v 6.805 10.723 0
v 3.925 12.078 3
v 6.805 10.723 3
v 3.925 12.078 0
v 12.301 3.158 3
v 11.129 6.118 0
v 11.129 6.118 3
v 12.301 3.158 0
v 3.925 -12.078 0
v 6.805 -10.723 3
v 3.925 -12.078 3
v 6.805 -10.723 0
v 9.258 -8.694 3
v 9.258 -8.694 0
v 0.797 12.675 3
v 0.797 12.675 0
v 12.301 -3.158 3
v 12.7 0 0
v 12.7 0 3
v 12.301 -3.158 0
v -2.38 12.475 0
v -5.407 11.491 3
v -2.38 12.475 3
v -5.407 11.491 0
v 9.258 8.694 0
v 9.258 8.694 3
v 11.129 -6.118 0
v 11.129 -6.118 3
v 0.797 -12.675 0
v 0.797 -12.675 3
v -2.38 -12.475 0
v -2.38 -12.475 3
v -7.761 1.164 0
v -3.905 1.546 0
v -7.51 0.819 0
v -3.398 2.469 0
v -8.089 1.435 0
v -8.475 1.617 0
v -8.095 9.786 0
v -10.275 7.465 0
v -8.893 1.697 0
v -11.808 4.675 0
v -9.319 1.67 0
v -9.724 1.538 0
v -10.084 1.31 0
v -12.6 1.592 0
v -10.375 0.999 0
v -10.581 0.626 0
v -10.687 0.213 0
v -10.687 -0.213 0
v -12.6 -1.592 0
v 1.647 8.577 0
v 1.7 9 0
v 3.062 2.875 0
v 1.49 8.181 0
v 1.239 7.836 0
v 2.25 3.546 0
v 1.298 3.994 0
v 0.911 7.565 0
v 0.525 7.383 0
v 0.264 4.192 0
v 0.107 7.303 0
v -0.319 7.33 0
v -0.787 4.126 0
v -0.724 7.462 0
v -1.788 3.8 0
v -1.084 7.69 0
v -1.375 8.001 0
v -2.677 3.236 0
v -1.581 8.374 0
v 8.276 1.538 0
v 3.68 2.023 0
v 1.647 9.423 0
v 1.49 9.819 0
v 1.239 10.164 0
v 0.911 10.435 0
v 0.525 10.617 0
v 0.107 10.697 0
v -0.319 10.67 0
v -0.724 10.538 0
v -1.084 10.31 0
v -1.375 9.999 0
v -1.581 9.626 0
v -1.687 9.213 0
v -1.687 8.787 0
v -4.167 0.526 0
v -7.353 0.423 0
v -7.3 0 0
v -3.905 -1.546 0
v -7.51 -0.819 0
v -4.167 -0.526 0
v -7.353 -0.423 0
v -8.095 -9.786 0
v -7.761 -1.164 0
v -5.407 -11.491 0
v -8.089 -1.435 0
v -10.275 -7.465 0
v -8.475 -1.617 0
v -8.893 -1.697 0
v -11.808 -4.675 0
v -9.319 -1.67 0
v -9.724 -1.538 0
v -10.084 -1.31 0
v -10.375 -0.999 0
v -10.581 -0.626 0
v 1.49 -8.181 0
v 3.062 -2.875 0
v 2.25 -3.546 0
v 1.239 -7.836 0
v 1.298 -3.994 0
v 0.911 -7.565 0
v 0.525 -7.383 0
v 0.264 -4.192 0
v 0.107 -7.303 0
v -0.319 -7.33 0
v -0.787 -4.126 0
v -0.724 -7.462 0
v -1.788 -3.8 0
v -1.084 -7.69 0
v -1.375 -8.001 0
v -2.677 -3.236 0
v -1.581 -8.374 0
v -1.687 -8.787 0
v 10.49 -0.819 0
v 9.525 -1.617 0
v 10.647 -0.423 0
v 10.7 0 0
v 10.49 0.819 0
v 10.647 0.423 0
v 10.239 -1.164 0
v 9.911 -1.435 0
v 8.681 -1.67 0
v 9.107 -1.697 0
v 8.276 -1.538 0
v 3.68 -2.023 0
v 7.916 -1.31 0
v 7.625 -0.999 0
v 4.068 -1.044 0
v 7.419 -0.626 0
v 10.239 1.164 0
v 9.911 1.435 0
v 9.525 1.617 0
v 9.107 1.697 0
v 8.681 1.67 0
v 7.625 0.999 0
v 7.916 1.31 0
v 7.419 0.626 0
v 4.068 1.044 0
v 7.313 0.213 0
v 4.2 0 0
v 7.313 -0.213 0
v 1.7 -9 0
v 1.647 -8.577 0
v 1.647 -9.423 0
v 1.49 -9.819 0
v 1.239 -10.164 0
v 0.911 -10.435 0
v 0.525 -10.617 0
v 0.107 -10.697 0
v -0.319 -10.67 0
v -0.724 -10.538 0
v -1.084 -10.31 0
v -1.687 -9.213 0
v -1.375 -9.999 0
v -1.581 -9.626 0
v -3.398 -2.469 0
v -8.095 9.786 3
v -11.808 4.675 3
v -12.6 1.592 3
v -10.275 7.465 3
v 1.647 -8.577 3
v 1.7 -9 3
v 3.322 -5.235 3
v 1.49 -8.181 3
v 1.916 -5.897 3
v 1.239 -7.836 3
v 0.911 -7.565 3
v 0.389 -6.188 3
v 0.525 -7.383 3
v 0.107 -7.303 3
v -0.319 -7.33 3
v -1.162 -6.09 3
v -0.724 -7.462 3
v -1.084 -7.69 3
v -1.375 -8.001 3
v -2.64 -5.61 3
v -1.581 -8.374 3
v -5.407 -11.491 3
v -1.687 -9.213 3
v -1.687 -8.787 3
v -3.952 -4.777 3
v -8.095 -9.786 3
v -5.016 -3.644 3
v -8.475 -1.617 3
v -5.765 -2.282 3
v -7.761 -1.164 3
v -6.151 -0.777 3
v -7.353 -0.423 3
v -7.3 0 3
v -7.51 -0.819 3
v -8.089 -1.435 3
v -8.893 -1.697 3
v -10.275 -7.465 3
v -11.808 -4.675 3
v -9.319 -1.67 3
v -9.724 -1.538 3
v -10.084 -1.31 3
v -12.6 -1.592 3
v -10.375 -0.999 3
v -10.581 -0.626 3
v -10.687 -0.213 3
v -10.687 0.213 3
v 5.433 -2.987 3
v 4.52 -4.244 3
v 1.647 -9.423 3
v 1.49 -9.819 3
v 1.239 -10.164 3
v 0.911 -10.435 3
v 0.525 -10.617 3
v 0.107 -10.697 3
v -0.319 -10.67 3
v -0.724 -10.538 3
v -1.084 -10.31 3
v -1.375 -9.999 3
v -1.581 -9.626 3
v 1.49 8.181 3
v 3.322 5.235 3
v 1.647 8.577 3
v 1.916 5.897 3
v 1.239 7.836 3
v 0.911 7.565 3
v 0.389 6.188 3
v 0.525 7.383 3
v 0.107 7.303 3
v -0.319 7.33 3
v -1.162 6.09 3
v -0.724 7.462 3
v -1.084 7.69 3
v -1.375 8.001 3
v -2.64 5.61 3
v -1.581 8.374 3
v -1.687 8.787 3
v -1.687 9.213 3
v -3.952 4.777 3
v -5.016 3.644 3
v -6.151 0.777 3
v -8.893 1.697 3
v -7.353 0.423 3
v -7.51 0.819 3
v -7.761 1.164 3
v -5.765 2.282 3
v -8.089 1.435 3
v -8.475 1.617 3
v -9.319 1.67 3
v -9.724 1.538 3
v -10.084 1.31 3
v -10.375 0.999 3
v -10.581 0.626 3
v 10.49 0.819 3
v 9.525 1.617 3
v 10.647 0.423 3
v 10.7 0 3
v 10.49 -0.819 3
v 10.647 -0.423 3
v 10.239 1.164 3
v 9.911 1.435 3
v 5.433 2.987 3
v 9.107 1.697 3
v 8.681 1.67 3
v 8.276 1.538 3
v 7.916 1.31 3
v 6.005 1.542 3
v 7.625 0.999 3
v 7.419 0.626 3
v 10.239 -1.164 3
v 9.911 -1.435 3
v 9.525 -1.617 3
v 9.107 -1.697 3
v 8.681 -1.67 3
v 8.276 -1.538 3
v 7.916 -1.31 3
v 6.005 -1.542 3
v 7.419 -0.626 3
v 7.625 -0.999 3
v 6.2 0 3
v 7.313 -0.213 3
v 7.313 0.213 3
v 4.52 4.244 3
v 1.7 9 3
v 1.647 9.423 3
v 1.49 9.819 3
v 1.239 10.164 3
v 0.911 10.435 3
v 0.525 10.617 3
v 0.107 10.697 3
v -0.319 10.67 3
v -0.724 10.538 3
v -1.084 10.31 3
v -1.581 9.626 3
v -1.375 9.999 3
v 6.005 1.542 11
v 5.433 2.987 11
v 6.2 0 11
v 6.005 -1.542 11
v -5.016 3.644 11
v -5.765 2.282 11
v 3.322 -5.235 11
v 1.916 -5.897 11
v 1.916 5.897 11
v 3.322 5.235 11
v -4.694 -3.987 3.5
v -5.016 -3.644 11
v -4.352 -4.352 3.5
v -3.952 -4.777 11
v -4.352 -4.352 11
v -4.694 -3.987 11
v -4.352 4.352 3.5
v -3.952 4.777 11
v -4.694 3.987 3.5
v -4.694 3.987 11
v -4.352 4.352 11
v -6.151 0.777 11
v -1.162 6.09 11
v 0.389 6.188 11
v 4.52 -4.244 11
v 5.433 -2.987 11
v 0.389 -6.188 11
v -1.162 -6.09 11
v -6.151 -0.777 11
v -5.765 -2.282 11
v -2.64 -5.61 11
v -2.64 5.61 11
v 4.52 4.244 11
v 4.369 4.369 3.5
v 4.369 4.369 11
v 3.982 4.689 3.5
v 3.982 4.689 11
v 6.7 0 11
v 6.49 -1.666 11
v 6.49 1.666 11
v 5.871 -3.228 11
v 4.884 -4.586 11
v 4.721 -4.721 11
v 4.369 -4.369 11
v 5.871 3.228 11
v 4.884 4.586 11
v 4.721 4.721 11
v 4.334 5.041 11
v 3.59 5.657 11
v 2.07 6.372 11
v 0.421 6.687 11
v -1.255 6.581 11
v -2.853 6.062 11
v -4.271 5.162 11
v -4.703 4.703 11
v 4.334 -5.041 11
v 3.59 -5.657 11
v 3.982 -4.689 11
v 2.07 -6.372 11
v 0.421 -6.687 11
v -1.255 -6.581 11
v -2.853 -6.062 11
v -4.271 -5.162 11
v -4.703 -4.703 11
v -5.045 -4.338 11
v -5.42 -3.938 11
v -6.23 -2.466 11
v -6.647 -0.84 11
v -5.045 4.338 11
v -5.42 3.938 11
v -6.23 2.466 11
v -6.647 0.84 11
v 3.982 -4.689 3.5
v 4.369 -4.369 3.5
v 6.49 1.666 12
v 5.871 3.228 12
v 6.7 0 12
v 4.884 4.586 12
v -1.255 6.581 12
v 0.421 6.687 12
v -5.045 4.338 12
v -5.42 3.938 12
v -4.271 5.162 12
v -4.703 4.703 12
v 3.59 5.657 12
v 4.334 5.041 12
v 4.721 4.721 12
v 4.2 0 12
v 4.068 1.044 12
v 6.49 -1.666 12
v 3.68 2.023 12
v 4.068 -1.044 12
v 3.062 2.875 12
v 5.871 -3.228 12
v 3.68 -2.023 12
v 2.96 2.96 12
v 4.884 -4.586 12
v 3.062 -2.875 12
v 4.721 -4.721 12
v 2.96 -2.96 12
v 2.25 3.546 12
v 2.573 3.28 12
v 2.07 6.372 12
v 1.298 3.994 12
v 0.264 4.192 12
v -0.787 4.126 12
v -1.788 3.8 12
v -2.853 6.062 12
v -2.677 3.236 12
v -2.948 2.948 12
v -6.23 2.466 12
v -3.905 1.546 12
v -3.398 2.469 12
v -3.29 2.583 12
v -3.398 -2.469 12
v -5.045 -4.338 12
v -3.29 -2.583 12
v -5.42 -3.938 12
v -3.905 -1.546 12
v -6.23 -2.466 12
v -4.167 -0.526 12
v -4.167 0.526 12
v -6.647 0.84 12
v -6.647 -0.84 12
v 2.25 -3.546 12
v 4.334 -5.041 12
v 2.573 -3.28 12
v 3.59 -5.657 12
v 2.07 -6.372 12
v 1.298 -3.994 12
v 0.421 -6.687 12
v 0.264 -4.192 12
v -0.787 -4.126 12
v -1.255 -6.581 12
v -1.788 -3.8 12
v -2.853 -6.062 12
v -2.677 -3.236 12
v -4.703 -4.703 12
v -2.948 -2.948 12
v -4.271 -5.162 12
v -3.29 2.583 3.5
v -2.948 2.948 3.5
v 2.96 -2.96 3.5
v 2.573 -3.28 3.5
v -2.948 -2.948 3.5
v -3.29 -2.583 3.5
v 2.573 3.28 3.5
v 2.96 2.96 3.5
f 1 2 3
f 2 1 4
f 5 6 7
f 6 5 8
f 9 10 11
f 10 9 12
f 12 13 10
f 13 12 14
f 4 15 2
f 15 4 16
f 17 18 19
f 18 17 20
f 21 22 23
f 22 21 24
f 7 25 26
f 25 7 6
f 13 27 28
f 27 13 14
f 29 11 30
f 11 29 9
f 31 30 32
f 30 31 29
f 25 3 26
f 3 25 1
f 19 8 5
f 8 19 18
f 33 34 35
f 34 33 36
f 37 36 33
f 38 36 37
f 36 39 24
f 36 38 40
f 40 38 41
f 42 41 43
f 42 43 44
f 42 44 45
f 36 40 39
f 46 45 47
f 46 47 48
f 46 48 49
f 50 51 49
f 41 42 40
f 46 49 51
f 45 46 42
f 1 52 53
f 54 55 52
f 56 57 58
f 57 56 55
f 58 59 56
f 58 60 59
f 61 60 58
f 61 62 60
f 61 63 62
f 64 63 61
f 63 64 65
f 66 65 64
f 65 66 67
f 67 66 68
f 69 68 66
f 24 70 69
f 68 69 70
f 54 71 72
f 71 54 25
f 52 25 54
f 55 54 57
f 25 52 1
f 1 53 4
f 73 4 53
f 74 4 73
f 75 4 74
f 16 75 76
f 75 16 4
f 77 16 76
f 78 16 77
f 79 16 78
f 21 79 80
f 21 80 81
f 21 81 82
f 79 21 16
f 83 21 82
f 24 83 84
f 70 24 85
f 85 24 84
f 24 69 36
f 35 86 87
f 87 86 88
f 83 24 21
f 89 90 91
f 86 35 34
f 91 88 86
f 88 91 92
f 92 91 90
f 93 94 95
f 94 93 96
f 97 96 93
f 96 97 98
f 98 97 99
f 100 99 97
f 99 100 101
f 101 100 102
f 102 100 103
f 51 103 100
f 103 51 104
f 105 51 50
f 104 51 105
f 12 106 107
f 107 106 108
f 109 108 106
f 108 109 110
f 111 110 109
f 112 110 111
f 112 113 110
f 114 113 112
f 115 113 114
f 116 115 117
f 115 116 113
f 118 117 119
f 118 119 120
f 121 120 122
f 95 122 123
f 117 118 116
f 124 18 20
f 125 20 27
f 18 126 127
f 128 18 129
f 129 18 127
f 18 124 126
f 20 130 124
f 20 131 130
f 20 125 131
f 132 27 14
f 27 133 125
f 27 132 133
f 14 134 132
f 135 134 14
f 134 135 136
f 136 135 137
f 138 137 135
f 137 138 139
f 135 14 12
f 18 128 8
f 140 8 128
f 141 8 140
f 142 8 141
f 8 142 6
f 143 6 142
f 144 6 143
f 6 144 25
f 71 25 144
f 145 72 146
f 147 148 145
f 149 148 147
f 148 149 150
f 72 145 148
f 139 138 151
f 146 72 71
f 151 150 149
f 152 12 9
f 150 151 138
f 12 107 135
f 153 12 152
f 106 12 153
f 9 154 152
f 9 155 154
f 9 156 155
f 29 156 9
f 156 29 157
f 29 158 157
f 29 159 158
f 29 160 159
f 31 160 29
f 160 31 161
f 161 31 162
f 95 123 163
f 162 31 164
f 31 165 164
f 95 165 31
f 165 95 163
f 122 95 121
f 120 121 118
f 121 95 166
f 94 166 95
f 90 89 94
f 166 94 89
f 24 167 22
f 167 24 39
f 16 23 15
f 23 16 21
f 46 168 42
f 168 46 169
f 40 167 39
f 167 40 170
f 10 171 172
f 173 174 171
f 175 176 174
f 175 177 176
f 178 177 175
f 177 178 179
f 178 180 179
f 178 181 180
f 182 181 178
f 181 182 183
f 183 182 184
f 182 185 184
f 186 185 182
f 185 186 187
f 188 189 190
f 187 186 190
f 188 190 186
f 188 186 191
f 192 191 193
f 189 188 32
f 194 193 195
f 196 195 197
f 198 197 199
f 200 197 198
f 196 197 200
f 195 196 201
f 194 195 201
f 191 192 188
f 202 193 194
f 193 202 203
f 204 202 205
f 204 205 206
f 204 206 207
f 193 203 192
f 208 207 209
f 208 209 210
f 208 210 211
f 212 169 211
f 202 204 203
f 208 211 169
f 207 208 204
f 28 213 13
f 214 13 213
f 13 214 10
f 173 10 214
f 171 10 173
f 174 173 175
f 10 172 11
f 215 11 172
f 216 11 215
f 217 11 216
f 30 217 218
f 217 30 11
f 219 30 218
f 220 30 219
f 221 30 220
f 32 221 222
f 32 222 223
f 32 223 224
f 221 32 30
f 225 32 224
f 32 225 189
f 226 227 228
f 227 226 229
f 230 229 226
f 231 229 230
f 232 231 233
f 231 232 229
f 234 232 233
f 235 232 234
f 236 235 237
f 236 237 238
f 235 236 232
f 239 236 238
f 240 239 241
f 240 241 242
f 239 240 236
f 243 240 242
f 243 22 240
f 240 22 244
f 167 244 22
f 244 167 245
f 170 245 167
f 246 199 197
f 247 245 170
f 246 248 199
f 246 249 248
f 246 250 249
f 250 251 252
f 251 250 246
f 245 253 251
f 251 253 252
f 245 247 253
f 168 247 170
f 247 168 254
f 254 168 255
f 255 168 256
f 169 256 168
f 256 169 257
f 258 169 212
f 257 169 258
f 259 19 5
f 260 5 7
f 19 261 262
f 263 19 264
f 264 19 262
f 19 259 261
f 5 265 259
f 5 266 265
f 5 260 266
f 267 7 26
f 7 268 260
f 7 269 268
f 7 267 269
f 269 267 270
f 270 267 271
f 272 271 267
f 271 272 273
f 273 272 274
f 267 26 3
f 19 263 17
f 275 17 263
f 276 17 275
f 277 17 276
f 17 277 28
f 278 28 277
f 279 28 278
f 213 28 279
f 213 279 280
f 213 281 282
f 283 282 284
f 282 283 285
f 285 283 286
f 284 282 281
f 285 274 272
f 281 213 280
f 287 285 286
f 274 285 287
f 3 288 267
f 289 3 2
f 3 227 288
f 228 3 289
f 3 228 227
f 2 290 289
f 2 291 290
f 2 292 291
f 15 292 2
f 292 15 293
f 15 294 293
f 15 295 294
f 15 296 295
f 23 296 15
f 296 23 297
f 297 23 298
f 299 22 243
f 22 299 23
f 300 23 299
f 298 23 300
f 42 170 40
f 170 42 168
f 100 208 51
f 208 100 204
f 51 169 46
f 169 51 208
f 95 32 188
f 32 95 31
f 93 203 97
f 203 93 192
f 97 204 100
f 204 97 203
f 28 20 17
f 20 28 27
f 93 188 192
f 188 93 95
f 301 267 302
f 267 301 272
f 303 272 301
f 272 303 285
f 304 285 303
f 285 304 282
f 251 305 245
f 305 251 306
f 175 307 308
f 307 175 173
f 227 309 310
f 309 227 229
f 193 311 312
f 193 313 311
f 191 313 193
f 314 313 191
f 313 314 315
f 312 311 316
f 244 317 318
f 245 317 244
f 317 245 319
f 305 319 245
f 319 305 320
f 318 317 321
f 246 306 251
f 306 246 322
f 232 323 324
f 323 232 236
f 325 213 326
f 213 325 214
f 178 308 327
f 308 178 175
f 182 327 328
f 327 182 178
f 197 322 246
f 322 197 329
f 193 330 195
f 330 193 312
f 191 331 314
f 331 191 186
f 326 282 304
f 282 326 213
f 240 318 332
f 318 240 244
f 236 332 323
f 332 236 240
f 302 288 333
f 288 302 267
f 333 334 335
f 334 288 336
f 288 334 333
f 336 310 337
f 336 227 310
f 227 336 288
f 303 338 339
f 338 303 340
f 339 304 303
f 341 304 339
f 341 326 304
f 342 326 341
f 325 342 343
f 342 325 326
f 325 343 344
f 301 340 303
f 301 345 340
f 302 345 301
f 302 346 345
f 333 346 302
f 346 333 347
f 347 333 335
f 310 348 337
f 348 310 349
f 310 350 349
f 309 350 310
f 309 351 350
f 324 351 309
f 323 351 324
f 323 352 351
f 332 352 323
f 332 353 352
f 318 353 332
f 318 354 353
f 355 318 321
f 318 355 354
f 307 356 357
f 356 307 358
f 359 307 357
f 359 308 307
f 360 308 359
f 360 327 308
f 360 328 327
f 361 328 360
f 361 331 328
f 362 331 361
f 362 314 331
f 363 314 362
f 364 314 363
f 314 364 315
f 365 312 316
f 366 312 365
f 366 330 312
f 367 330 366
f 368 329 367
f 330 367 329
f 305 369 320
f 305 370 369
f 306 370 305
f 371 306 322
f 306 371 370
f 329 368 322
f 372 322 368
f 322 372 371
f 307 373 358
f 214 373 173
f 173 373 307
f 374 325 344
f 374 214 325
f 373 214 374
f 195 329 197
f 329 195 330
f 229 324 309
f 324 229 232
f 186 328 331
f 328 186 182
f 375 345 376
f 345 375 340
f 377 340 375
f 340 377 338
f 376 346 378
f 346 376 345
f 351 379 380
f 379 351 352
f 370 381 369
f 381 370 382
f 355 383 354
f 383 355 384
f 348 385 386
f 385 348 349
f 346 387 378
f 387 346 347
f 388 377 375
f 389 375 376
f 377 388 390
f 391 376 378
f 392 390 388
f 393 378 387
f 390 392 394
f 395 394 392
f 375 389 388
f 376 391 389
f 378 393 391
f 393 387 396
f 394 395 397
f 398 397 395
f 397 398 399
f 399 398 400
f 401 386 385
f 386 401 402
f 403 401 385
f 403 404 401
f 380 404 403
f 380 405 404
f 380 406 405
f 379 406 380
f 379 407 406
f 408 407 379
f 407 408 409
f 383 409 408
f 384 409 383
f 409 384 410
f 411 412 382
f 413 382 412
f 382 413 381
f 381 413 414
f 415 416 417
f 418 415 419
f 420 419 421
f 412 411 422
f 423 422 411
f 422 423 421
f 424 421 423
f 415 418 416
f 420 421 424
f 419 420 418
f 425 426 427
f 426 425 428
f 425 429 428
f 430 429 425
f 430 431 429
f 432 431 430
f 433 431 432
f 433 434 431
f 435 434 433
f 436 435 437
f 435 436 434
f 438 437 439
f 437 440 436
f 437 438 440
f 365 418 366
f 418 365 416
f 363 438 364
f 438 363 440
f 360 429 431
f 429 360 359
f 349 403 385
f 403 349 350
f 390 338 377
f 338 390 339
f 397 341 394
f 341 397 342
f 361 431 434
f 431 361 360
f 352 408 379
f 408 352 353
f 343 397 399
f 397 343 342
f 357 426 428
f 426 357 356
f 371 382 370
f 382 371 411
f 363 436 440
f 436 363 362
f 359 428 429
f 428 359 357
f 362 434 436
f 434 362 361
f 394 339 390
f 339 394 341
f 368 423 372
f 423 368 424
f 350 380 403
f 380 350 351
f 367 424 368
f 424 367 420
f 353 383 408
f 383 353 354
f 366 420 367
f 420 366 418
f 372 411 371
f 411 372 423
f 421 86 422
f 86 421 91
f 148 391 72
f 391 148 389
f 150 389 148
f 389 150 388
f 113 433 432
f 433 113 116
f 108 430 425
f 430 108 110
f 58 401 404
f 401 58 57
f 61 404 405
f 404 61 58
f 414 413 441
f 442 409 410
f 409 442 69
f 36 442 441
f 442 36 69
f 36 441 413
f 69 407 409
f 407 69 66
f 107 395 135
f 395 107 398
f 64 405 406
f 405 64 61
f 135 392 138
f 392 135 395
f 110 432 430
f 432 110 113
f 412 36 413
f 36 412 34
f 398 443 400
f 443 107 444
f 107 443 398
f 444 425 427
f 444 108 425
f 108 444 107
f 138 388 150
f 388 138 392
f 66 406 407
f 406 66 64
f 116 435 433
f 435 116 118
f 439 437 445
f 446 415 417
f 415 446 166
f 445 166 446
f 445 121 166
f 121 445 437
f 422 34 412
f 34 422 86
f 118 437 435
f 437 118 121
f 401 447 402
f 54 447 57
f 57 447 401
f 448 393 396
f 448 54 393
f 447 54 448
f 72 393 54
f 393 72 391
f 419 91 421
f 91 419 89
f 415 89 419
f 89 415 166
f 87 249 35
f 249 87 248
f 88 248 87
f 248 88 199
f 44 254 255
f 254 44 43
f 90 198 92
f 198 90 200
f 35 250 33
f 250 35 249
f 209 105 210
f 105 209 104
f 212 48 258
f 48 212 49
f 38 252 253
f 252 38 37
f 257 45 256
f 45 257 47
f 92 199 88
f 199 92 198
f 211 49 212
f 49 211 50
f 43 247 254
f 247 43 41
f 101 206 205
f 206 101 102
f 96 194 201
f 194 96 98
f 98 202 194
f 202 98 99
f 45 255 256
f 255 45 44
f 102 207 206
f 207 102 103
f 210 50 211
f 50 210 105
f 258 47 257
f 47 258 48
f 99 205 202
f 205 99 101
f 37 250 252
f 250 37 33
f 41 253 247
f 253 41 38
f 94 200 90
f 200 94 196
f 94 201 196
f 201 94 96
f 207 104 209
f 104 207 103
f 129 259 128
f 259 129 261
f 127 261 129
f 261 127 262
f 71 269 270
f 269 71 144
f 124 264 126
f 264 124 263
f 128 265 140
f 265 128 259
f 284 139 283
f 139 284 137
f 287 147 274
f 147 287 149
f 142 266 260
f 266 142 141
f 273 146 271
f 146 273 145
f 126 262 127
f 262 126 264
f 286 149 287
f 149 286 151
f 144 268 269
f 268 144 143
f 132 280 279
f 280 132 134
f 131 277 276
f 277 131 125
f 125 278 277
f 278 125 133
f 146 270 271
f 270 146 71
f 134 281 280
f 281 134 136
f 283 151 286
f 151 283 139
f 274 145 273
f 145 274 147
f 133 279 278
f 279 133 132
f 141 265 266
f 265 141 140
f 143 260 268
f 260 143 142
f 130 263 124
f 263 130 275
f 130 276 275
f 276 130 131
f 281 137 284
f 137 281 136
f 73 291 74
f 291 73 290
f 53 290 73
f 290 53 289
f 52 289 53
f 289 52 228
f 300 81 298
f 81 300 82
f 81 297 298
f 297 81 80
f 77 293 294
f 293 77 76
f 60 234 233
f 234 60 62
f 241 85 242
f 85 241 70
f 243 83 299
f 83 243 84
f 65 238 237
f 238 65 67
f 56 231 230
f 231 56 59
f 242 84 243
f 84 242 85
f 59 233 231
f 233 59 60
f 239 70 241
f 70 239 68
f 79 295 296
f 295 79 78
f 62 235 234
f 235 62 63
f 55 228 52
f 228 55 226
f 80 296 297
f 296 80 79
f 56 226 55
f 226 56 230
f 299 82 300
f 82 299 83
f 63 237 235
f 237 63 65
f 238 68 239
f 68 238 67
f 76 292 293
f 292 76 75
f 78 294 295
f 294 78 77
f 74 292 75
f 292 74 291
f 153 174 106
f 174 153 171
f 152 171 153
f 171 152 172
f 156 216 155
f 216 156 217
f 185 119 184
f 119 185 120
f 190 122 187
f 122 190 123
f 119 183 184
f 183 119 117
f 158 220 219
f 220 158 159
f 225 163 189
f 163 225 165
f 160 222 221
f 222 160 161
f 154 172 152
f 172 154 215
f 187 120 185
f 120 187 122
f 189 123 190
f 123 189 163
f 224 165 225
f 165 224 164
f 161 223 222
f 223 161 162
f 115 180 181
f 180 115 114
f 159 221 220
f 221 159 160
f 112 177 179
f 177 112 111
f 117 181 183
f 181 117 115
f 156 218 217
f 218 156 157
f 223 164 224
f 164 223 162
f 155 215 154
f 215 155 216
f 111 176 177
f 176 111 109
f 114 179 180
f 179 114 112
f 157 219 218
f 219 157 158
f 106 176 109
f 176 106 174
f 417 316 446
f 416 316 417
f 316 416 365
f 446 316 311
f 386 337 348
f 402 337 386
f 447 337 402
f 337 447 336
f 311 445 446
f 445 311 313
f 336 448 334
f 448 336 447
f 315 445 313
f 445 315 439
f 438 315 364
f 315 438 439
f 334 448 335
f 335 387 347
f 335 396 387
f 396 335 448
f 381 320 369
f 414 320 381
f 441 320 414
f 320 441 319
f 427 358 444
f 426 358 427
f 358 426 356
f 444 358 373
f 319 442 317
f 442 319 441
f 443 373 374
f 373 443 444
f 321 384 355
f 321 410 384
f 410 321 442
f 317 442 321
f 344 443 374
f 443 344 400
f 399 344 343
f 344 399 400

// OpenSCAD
$fn = 25;
d_1 = 8.0; // axis diameter

r_1 = d_1 / 2 + 0.2;
r_hh = 9.0;       // distance to mounting holes
r_2 = r_1 + 2.0;  // collar place
r_h = 1.5 + 0.2;
r_b = r_hh + r_h + 2.0;
r_3 = r_2 + 0.5;  // ring above
h_b = 3.0;
h_2 = 8.0;
h_3 = 1.0;

difference() {
  union() {
    cylinder( r=r_b, h=h_b );
    translate( [0,0,h_b] ) cylinder( r=r_2, h=h_2 );
    translate( [0,0,h_b+h_2] ) cylinder( r=r_3, h=h_3 );
  }
  cylinder( r=r_1, h=h_b+h_2+h_3 );
  translate( [-r_hh,0,0] ) cylinder( r=r_h, h=h_b );
  translate( [ r_hh,0,0] ) cylinder( r=r_h, h=h_b );
  translate( [0, r_hh,0] ) cylinder( r=r_h, h=h_b );
  translate( [0,-r_hh,0] ) cylinder( r=r_h, h=h_b );
  rotate([0,0, 45] ) translate( [-r_3,0,h_b+0.5] )  cube([2*r_3,0.5,h_2+h_3]) ;
  rotate([0,0,135] ) translate( [-r_3,0,h_b+0.5] )  cube([2*r_3,0.5,h_2+h_3]) ;
}
